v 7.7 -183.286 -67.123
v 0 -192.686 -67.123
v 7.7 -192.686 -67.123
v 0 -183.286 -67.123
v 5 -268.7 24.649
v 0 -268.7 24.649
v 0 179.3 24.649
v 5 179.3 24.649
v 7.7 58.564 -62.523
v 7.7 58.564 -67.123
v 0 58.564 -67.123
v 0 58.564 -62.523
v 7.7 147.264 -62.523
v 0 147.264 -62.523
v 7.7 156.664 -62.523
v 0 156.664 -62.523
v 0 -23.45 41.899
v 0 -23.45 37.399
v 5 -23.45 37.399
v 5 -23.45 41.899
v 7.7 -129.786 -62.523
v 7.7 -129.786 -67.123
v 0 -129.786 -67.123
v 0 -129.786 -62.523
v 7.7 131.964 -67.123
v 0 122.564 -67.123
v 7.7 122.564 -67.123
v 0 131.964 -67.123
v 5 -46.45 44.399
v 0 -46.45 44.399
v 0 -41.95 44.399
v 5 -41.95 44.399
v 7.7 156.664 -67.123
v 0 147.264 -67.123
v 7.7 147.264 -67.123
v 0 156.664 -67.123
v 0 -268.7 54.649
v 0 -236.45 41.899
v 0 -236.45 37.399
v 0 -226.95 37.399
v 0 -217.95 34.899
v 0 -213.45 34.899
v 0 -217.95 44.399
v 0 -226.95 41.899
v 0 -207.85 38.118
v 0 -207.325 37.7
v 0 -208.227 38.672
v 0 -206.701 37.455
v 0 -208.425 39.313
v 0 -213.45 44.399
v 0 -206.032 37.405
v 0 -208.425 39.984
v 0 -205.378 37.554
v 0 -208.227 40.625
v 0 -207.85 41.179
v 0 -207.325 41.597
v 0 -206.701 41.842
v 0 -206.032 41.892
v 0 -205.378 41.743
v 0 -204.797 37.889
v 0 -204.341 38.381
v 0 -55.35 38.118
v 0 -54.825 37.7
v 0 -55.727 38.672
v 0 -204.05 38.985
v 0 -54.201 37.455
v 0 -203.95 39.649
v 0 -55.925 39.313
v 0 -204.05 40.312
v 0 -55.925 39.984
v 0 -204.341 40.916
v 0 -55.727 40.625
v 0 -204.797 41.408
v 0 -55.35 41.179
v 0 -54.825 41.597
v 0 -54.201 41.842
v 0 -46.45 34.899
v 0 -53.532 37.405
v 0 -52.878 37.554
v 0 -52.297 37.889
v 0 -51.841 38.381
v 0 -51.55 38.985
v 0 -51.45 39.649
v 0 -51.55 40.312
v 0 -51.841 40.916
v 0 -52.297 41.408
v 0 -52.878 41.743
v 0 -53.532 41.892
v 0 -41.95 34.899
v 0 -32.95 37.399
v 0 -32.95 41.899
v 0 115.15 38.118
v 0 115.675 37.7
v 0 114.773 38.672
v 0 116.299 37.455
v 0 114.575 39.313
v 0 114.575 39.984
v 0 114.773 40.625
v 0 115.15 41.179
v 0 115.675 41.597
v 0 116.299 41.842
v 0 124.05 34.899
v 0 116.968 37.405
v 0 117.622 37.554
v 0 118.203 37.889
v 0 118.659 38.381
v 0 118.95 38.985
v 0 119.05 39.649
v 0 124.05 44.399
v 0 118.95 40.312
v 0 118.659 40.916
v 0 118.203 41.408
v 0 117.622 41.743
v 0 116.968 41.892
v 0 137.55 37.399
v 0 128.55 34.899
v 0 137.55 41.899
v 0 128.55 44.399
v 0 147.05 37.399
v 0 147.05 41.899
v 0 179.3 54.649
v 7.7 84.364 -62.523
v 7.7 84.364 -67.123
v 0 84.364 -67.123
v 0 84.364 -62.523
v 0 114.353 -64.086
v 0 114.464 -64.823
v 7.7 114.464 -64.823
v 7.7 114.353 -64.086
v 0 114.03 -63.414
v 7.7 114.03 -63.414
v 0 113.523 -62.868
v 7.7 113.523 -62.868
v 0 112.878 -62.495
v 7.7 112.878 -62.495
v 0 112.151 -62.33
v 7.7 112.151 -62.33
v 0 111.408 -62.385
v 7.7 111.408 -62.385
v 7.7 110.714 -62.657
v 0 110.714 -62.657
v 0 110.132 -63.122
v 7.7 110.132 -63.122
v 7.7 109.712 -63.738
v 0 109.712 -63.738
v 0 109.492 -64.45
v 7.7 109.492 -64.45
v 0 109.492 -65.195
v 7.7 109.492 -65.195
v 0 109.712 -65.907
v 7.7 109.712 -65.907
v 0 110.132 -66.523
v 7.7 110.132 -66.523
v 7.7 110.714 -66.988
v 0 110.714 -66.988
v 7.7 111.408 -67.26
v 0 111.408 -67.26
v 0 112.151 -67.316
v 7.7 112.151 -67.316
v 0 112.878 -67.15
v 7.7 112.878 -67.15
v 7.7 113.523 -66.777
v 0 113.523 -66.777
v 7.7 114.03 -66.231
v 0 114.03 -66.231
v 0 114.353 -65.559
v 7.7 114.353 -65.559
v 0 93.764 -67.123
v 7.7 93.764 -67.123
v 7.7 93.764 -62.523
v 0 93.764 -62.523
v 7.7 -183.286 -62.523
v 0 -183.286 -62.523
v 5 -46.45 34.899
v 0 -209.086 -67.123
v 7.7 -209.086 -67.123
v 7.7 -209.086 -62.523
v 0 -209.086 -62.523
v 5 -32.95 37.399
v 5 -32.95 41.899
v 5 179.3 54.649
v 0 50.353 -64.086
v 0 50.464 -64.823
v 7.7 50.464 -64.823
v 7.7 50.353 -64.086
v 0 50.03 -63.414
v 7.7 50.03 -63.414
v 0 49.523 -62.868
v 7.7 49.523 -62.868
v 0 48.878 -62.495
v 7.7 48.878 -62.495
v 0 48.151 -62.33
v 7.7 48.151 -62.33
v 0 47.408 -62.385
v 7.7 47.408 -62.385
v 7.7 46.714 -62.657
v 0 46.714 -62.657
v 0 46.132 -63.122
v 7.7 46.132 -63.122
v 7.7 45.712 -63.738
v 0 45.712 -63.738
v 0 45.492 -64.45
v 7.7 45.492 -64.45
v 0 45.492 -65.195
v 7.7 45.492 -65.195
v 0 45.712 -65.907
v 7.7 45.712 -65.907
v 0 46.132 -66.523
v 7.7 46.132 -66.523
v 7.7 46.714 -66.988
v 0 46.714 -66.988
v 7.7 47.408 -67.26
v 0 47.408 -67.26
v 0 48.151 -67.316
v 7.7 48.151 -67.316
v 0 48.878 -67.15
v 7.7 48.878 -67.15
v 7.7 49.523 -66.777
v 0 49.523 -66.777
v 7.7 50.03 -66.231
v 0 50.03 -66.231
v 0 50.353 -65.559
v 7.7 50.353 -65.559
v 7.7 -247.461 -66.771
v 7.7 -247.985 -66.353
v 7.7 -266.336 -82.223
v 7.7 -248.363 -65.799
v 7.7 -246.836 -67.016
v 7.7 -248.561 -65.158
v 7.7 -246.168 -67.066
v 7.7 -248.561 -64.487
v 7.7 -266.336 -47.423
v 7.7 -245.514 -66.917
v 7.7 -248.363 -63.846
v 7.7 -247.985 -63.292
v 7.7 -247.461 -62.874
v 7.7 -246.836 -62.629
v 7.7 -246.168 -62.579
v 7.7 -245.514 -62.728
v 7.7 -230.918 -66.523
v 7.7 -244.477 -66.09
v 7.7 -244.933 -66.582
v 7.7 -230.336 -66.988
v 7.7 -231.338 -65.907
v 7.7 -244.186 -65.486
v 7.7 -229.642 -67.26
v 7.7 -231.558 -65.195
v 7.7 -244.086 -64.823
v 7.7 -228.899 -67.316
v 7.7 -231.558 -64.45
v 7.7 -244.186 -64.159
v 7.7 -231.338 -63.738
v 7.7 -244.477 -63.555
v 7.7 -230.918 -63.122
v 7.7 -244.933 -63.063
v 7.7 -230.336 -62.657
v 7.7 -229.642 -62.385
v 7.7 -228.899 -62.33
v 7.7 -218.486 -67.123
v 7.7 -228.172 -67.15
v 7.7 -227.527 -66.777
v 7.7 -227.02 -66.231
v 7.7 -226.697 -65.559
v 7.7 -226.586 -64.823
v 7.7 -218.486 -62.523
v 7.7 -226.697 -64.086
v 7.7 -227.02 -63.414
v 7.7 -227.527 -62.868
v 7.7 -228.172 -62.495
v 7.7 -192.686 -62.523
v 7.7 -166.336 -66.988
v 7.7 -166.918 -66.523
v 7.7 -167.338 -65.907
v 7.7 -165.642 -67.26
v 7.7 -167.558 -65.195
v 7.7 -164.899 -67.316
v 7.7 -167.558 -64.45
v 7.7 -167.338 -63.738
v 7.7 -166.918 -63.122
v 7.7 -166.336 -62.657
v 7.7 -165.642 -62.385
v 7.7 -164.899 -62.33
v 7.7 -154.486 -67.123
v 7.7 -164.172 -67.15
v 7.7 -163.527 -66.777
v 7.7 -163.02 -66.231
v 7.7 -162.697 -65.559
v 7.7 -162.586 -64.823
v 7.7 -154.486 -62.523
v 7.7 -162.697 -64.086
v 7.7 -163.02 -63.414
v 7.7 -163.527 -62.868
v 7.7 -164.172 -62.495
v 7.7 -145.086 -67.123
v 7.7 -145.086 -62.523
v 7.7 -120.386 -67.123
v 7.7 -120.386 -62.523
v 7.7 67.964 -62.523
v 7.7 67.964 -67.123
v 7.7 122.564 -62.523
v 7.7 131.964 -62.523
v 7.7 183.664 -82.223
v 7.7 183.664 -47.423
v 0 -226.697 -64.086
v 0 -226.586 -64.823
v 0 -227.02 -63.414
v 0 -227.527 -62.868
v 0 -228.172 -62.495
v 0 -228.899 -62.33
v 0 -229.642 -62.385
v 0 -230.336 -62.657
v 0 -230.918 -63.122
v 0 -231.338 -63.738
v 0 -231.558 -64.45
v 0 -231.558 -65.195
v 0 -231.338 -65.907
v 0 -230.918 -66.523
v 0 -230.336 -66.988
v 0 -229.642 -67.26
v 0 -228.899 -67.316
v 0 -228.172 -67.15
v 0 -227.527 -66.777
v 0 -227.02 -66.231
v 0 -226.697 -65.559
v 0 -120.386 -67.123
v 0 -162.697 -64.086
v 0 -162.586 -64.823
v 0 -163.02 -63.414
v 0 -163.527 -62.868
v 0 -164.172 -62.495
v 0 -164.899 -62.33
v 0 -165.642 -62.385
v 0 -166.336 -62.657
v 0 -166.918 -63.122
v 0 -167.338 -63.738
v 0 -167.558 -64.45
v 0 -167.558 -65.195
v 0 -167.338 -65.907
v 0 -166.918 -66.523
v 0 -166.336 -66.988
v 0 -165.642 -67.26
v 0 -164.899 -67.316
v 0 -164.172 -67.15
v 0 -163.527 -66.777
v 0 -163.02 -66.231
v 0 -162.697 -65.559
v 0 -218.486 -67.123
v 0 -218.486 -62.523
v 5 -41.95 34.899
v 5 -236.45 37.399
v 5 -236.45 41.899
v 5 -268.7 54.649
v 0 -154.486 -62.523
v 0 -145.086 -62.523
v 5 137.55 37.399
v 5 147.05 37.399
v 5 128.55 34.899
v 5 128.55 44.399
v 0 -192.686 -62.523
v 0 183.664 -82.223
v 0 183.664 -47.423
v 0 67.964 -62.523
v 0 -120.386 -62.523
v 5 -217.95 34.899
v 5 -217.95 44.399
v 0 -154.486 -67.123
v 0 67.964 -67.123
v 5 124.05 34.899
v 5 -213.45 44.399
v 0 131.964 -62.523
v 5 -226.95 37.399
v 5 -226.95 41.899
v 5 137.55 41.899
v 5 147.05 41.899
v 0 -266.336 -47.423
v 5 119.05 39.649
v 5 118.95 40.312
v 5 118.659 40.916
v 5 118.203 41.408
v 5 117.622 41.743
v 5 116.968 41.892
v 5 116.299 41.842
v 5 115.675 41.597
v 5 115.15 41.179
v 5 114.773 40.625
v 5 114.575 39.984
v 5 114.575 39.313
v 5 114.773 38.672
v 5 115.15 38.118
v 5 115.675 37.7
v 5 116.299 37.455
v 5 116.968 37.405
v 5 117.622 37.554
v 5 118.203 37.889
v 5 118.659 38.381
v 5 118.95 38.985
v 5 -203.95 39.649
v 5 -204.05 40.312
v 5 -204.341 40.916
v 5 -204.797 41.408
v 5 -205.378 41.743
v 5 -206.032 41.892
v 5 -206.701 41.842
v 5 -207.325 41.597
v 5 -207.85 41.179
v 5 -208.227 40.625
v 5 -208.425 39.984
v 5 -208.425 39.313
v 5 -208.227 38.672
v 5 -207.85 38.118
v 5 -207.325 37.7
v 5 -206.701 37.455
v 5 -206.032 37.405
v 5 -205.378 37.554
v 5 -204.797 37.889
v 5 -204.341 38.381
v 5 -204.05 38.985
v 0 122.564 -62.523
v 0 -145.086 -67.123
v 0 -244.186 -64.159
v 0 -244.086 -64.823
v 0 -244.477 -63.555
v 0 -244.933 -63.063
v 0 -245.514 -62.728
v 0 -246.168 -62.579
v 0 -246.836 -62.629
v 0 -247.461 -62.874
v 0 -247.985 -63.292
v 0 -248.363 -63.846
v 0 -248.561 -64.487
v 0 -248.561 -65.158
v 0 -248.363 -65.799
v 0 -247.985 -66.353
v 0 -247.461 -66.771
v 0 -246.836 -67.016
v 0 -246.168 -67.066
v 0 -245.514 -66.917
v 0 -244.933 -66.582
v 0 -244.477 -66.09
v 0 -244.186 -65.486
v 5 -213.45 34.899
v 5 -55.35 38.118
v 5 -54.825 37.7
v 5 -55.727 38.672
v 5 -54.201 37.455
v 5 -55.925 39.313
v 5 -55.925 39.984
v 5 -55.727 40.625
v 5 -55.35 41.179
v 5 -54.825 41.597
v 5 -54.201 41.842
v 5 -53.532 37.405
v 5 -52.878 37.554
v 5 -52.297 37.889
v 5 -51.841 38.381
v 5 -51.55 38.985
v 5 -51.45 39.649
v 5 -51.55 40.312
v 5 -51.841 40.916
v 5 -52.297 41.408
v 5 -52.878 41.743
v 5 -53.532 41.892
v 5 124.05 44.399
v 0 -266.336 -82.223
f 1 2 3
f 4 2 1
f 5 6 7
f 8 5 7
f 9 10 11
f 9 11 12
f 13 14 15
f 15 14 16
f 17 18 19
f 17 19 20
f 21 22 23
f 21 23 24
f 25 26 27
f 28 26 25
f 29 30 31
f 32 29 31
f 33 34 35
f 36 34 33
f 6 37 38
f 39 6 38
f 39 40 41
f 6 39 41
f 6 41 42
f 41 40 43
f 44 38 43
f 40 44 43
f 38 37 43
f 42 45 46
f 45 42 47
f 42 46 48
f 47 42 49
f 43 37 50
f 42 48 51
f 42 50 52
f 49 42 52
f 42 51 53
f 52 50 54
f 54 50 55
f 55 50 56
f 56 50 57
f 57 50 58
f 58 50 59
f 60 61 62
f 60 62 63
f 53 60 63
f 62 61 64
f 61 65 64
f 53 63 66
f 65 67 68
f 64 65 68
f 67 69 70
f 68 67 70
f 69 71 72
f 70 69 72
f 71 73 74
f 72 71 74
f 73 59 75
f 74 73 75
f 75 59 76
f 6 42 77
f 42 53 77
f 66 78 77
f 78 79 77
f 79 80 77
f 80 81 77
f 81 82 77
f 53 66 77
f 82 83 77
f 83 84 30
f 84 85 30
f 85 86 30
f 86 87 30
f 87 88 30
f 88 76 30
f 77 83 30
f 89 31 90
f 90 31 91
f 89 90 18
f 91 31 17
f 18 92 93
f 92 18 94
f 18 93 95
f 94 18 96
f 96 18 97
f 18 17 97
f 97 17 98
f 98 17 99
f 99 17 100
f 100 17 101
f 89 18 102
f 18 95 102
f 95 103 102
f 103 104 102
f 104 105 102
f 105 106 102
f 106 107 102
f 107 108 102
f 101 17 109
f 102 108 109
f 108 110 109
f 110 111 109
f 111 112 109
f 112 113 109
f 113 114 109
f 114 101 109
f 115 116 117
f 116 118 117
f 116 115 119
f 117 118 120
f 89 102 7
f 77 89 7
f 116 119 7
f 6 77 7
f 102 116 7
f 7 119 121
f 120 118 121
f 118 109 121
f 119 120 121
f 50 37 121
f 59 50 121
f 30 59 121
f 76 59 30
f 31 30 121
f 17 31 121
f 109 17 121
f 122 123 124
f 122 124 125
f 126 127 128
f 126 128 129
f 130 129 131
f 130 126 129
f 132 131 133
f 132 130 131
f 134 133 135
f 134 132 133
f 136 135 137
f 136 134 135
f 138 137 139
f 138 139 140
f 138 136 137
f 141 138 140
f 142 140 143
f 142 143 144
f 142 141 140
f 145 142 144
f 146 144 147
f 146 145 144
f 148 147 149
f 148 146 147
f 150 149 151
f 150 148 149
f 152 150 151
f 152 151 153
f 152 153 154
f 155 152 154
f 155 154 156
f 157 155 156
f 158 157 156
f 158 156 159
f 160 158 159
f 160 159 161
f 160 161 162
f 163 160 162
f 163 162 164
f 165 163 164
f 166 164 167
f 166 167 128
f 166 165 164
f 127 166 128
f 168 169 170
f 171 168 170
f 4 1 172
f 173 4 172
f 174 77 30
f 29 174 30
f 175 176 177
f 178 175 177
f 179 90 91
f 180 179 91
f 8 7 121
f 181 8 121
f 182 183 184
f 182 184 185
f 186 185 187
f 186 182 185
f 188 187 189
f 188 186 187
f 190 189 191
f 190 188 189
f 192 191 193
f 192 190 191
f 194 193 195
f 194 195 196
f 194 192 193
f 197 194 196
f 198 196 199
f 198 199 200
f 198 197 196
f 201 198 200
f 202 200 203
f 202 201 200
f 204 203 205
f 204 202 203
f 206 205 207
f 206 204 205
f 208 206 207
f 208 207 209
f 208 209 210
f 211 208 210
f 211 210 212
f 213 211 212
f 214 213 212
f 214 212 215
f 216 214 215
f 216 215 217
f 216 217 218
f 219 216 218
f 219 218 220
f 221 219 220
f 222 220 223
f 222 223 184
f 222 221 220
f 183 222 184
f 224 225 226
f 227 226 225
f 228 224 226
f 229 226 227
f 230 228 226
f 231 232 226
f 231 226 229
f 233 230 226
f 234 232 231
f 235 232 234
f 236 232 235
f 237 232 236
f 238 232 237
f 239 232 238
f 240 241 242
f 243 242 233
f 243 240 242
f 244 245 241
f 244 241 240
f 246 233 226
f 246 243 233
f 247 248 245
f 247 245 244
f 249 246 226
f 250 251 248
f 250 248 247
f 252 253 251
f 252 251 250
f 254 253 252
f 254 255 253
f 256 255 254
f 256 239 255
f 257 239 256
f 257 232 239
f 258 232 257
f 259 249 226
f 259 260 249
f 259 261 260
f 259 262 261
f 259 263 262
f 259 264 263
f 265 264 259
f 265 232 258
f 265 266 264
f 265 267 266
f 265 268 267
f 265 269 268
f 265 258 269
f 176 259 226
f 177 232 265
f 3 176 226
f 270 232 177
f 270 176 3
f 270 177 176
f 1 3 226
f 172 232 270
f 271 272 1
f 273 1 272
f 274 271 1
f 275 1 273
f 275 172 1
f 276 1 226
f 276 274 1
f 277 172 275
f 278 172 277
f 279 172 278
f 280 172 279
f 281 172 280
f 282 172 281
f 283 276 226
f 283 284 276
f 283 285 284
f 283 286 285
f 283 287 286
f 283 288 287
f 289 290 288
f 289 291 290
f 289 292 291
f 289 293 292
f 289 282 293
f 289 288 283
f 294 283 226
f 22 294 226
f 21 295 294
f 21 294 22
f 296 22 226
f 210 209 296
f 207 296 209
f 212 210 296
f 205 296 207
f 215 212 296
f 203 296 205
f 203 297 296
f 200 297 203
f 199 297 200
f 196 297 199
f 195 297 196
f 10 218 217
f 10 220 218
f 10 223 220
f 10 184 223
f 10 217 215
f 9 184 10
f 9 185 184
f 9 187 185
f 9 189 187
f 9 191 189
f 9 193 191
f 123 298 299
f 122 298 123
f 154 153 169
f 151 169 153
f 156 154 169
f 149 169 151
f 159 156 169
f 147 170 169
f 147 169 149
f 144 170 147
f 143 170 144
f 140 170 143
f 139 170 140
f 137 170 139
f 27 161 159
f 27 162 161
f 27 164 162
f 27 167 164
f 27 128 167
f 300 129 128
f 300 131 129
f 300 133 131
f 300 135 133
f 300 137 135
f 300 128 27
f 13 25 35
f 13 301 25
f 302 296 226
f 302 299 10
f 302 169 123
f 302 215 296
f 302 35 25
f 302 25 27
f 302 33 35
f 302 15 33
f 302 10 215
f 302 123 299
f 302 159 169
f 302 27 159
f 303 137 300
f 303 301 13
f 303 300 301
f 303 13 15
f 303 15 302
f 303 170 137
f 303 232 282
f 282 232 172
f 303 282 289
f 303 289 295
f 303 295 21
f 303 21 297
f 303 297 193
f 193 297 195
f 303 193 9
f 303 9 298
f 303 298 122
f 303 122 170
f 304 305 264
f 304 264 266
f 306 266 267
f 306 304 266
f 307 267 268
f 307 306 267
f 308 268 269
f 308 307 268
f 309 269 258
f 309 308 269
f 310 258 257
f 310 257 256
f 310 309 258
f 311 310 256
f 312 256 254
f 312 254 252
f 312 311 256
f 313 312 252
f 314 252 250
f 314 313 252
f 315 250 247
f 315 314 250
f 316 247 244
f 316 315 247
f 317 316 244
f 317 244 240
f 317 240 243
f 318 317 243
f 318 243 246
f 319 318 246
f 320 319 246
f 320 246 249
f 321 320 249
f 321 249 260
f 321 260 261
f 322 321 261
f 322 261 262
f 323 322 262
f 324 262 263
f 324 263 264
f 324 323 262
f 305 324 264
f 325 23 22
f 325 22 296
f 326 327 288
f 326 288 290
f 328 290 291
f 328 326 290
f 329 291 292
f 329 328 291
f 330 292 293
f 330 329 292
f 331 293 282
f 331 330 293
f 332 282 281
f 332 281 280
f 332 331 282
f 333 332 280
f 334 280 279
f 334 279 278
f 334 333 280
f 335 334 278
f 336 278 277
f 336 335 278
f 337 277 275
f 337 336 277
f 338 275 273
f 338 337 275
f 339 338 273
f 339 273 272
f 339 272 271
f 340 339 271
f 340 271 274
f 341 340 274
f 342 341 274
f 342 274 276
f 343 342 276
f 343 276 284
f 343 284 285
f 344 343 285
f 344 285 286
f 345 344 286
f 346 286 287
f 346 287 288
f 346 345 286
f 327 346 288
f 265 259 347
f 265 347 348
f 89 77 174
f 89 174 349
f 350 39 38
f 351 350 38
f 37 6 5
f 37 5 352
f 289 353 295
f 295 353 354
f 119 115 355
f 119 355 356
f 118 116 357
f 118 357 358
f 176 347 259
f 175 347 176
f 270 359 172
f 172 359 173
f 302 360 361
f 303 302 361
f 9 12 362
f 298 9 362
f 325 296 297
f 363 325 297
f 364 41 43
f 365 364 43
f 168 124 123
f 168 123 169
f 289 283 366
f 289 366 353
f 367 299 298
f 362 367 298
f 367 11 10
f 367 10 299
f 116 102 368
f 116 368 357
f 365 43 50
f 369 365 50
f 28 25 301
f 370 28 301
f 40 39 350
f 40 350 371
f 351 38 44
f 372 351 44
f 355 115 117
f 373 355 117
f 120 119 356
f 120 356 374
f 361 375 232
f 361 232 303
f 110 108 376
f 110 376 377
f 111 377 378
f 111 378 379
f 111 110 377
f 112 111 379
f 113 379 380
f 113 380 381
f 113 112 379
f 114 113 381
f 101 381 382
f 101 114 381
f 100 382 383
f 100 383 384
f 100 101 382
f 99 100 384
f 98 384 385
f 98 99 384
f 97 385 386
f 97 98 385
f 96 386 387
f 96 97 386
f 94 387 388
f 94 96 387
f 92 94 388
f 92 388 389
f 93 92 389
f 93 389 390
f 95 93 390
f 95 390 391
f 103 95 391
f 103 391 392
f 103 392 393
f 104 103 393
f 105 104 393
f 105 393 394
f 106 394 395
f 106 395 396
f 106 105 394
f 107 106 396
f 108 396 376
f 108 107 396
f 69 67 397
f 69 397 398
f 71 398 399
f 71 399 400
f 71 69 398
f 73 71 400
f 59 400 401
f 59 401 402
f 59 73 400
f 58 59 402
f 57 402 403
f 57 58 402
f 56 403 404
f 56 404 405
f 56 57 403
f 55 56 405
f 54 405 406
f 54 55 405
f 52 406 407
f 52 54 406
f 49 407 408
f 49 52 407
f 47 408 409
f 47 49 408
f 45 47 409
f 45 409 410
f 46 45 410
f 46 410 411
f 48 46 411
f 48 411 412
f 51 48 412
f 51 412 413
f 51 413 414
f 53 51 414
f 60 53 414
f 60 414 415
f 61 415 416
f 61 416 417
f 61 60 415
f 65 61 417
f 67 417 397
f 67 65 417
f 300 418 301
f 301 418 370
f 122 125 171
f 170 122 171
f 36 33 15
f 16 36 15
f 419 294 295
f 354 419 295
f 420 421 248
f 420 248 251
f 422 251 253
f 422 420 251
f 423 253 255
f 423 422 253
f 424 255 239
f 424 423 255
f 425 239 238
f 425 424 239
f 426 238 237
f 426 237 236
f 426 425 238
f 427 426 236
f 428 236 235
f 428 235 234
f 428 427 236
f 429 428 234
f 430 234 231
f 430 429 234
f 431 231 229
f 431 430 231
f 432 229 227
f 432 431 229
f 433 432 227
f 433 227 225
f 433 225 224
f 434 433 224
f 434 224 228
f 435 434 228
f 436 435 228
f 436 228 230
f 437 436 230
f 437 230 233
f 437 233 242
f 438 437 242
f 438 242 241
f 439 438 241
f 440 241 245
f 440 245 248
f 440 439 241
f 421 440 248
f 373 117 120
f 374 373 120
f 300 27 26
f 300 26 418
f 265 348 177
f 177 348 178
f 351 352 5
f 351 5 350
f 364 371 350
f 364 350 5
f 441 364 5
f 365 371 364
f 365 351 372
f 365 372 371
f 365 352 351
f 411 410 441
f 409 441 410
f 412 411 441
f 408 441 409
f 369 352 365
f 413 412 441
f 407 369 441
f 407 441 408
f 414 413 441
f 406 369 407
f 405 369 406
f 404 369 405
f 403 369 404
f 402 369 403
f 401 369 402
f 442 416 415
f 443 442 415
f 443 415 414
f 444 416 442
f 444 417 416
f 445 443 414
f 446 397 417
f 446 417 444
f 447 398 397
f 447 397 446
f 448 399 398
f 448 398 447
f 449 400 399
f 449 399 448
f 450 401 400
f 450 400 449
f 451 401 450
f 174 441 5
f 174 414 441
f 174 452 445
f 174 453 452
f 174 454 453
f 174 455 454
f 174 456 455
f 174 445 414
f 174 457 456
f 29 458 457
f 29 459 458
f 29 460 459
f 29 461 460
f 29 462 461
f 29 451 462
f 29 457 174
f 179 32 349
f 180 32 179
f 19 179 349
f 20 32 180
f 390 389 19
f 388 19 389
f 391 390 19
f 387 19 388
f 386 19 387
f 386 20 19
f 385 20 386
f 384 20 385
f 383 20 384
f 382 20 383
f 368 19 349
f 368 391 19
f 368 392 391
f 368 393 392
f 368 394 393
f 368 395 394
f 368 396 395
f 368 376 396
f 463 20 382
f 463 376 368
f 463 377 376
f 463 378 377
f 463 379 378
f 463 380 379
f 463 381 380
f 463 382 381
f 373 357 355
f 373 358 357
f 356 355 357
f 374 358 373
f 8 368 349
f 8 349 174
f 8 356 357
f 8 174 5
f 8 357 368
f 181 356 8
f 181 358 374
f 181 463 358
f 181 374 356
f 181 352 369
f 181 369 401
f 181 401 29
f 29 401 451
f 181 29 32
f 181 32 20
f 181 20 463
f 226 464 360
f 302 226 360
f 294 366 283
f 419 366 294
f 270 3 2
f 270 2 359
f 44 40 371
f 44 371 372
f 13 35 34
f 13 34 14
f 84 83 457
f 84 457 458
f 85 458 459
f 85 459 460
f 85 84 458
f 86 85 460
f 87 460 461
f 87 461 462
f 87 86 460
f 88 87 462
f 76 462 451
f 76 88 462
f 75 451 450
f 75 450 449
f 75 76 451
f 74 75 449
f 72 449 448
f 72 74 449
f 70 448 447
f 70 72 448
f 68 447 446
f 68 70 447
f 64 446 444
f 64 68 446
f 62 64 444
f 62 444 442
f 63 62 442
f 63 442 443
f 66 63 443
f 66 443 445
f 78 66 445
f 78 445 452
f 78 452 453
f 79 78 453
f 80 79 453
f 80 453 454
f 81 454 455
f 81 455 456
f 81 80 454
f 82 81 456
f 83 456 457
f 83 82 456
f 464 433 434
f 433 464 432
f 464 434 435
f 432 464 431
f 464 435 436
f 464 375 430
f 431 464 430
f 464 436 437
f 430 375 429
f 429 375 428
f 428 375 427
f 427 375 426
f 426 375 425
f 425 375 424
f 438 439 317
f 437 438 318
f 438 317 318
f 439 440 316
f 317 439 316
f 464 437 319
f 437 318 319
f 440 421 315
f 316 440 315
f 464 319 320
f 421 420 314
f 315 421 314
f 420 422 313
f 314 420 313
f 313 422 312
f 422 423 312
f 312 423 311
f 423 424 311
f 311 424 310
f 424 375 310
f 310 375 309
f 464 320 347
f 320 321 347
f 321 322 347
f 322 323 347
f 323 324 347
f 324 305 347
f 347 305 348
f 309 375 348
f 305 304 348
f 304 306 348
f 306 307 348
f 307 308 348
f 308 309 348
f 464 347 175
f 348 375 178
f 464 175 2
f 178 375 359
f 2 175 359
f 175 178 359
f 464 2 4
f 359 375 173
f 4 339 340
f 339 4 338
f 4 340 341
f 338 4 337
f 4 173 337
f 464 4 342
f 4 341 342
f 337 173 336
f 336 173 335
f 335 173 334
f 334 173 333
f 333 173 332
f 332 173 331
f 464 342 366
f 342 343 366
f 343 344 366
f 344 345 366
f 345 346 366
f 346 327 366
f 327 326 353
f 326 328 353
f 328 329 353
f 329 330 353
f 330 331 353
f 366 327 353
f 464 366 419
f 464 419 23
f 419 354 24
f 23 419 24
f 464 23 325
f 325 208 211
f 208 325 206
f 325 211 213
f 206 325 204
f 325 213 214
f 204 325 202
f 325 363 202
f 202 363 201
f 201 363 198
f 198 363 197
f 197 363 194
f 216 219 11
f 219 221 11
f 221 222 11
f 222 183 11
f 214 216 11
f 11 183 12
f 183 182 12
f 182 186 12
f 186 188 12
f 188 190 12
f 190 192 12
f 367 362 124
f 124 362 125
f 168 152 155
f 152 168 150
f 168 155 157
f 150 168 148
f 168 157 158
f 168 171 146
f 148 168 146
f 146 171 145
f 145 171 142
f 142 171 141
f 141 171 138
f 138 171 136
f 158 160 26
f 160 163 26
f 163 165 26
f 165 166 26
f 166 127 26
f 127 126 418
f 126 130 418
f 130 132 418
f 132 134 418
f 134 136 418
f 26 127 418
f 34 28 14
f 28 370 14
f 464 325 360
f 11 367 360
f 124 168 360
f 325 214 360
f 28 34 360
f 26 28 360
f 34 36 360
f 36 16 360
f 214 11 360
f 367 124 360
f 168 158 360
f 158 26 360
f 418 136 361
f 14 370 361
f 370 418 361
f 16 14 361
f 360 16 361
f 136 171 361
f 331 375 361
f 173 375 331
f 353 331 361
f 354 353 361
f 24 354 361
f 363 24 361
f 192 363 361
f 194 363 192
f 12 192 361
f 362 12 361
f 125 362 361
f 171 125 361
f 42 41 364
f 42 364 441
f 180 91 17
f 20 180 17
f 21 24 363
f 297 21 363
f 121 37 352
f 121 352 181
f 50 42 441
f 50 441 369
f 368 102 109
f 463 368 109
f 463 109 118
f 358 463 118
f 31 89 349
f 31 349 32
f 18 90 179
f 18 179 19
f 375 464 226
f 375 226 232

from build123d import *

# Parameters (mm, degrees)
F0_W     = 450
F0_H     = 34.8
F0_R     = 2.25
F0_R_2   = 2.5
F0_W_2   = 9.4
F0_H_2   = 4.6
F2_DEPTH = 7.7
F1_W     = 448
F1_H     = 30
F1_W_2   = 9.5
F1_H_2   = 4.5
F1_W_3   = 4.5
F1_H_3   = 9.5
F1_R     = 2.25
F3_DEPTH = 5


with BuildPart() as f2:
    # F0 (on Right) → F2 (new body)
    with BuildSketch(Plane.YZ):
        with Locations((-41.335793, -64.822553)):
            Rectangle(F0_W, F0_H)
        with Locations((-246.335793, -64.822553)):
            Circle(F0_R, mode=Mode.SUBTRACT)
        with Locations((-229.085793, -64.822553)):
            Circle(F0_R_2, mode=Mode.SUBTRACT)
        with Locations((-213.785793, -64.822553)):
            Rectangle(F0_W_2, F0_H_2, mode=Mode.SUBTRACT)
        with Locations((-187.985793, -64.822553)):
            Rectangle(F0_W_2, F0_H_2, mode=Mode.SUBTRACT)
        with Locations((-165.085793, -64.822553)):
            Circle(F0_R_2, mode=Mode.SUBTRACT)
        with Locations((-149.785793, -64.822553)):
            Rectangle(F0_W_2, F0_H_2, mode=Mode.SUBTRACT)
        with Locations((-125.085793, -64.822553)):
            Rectangle(F0_W_2, F0_H_2, mode=Mode.SUBTRACT)
        with Locations((63.264207, -64.822553)):
            Rectangle(F0_W_2, F0_H_2, mode=Mode.SUBTRACT)
        with Locations((151.964207, -64.822553)):
            Rectangle(F0_W_2, F0_H_2, mode=Mode.SUBTRACT)
        with Locations((47.964207, -64.822553)):
            Circle(F0_R_2, mode=Mode.SUBTRACT)
        with Locations((89.064207, -64.822553)):
            Rectangle(F0_W_2, F0_H_2, mode=Mode.SUBTRACT)
        with Locations((111.964207, -64.822553)):
            Circle(F0_R_2, mode=Mode.SUBTRACT)
        with Locations((127.264207, -64.822553)):
            Rectangle(F0_W_2, F0_H_2, mode=Mode.SUBTRACT)
    extrude(amount=F2_DEPTH)


with BuildPart() as f3:
    # F1 (on Right) → F3 (new body)
    with BuildSketch(Plane.YZ):
        with Locations((-44.70029, 39.648528)):
            Rectangle(F1_W, F1_H)
        with Locations((-231.70029, 39.648528)):
            Rectangle(F1_W_2, F1_H_2, mode=Mode.SUBTRACT)
        with Locations((-215.70029, 39.648528)):
            Rectangle(F1_W_3, F1_H_3, mode=Mode.SUBTRACT)
        with Locations((-206.20029, 39.648528)):
            Circle(F1_R, mode=Mode.SUBTRACT)
        with Locations((-53.70029, 39.648528)):
            Circle(F1_R, mode=Mode.SUBTRACT)
        with Locations((-44.20029, 39.648528)):
            Rectangle(F1_W_3, F1_H_3, mode=Mode.SUBTRACT)
        with Locations((-28.20029, 39.648528)):
            Rectangle(F1_W_2, F1_H_2, mode=Mode.SUBTRACT)
        with Locations((116.79971, 39.648528)):
            Circle(F1_R, mode=Mode.SUBTRACT)
        with Locations((126.29971, 39.648528)):
            Rectangle(F1_W_3, F1_H_3, mode=Mode.SUBTRACT)
        with Locations((142.29971, 39.648528)):
            Rectangle(F1_W_2, F1_H_2, mode=Mode.SUBTRACT)
    extrude(amount=F3_DEPTH)


solid = Compound([f2.part, f3.part])
